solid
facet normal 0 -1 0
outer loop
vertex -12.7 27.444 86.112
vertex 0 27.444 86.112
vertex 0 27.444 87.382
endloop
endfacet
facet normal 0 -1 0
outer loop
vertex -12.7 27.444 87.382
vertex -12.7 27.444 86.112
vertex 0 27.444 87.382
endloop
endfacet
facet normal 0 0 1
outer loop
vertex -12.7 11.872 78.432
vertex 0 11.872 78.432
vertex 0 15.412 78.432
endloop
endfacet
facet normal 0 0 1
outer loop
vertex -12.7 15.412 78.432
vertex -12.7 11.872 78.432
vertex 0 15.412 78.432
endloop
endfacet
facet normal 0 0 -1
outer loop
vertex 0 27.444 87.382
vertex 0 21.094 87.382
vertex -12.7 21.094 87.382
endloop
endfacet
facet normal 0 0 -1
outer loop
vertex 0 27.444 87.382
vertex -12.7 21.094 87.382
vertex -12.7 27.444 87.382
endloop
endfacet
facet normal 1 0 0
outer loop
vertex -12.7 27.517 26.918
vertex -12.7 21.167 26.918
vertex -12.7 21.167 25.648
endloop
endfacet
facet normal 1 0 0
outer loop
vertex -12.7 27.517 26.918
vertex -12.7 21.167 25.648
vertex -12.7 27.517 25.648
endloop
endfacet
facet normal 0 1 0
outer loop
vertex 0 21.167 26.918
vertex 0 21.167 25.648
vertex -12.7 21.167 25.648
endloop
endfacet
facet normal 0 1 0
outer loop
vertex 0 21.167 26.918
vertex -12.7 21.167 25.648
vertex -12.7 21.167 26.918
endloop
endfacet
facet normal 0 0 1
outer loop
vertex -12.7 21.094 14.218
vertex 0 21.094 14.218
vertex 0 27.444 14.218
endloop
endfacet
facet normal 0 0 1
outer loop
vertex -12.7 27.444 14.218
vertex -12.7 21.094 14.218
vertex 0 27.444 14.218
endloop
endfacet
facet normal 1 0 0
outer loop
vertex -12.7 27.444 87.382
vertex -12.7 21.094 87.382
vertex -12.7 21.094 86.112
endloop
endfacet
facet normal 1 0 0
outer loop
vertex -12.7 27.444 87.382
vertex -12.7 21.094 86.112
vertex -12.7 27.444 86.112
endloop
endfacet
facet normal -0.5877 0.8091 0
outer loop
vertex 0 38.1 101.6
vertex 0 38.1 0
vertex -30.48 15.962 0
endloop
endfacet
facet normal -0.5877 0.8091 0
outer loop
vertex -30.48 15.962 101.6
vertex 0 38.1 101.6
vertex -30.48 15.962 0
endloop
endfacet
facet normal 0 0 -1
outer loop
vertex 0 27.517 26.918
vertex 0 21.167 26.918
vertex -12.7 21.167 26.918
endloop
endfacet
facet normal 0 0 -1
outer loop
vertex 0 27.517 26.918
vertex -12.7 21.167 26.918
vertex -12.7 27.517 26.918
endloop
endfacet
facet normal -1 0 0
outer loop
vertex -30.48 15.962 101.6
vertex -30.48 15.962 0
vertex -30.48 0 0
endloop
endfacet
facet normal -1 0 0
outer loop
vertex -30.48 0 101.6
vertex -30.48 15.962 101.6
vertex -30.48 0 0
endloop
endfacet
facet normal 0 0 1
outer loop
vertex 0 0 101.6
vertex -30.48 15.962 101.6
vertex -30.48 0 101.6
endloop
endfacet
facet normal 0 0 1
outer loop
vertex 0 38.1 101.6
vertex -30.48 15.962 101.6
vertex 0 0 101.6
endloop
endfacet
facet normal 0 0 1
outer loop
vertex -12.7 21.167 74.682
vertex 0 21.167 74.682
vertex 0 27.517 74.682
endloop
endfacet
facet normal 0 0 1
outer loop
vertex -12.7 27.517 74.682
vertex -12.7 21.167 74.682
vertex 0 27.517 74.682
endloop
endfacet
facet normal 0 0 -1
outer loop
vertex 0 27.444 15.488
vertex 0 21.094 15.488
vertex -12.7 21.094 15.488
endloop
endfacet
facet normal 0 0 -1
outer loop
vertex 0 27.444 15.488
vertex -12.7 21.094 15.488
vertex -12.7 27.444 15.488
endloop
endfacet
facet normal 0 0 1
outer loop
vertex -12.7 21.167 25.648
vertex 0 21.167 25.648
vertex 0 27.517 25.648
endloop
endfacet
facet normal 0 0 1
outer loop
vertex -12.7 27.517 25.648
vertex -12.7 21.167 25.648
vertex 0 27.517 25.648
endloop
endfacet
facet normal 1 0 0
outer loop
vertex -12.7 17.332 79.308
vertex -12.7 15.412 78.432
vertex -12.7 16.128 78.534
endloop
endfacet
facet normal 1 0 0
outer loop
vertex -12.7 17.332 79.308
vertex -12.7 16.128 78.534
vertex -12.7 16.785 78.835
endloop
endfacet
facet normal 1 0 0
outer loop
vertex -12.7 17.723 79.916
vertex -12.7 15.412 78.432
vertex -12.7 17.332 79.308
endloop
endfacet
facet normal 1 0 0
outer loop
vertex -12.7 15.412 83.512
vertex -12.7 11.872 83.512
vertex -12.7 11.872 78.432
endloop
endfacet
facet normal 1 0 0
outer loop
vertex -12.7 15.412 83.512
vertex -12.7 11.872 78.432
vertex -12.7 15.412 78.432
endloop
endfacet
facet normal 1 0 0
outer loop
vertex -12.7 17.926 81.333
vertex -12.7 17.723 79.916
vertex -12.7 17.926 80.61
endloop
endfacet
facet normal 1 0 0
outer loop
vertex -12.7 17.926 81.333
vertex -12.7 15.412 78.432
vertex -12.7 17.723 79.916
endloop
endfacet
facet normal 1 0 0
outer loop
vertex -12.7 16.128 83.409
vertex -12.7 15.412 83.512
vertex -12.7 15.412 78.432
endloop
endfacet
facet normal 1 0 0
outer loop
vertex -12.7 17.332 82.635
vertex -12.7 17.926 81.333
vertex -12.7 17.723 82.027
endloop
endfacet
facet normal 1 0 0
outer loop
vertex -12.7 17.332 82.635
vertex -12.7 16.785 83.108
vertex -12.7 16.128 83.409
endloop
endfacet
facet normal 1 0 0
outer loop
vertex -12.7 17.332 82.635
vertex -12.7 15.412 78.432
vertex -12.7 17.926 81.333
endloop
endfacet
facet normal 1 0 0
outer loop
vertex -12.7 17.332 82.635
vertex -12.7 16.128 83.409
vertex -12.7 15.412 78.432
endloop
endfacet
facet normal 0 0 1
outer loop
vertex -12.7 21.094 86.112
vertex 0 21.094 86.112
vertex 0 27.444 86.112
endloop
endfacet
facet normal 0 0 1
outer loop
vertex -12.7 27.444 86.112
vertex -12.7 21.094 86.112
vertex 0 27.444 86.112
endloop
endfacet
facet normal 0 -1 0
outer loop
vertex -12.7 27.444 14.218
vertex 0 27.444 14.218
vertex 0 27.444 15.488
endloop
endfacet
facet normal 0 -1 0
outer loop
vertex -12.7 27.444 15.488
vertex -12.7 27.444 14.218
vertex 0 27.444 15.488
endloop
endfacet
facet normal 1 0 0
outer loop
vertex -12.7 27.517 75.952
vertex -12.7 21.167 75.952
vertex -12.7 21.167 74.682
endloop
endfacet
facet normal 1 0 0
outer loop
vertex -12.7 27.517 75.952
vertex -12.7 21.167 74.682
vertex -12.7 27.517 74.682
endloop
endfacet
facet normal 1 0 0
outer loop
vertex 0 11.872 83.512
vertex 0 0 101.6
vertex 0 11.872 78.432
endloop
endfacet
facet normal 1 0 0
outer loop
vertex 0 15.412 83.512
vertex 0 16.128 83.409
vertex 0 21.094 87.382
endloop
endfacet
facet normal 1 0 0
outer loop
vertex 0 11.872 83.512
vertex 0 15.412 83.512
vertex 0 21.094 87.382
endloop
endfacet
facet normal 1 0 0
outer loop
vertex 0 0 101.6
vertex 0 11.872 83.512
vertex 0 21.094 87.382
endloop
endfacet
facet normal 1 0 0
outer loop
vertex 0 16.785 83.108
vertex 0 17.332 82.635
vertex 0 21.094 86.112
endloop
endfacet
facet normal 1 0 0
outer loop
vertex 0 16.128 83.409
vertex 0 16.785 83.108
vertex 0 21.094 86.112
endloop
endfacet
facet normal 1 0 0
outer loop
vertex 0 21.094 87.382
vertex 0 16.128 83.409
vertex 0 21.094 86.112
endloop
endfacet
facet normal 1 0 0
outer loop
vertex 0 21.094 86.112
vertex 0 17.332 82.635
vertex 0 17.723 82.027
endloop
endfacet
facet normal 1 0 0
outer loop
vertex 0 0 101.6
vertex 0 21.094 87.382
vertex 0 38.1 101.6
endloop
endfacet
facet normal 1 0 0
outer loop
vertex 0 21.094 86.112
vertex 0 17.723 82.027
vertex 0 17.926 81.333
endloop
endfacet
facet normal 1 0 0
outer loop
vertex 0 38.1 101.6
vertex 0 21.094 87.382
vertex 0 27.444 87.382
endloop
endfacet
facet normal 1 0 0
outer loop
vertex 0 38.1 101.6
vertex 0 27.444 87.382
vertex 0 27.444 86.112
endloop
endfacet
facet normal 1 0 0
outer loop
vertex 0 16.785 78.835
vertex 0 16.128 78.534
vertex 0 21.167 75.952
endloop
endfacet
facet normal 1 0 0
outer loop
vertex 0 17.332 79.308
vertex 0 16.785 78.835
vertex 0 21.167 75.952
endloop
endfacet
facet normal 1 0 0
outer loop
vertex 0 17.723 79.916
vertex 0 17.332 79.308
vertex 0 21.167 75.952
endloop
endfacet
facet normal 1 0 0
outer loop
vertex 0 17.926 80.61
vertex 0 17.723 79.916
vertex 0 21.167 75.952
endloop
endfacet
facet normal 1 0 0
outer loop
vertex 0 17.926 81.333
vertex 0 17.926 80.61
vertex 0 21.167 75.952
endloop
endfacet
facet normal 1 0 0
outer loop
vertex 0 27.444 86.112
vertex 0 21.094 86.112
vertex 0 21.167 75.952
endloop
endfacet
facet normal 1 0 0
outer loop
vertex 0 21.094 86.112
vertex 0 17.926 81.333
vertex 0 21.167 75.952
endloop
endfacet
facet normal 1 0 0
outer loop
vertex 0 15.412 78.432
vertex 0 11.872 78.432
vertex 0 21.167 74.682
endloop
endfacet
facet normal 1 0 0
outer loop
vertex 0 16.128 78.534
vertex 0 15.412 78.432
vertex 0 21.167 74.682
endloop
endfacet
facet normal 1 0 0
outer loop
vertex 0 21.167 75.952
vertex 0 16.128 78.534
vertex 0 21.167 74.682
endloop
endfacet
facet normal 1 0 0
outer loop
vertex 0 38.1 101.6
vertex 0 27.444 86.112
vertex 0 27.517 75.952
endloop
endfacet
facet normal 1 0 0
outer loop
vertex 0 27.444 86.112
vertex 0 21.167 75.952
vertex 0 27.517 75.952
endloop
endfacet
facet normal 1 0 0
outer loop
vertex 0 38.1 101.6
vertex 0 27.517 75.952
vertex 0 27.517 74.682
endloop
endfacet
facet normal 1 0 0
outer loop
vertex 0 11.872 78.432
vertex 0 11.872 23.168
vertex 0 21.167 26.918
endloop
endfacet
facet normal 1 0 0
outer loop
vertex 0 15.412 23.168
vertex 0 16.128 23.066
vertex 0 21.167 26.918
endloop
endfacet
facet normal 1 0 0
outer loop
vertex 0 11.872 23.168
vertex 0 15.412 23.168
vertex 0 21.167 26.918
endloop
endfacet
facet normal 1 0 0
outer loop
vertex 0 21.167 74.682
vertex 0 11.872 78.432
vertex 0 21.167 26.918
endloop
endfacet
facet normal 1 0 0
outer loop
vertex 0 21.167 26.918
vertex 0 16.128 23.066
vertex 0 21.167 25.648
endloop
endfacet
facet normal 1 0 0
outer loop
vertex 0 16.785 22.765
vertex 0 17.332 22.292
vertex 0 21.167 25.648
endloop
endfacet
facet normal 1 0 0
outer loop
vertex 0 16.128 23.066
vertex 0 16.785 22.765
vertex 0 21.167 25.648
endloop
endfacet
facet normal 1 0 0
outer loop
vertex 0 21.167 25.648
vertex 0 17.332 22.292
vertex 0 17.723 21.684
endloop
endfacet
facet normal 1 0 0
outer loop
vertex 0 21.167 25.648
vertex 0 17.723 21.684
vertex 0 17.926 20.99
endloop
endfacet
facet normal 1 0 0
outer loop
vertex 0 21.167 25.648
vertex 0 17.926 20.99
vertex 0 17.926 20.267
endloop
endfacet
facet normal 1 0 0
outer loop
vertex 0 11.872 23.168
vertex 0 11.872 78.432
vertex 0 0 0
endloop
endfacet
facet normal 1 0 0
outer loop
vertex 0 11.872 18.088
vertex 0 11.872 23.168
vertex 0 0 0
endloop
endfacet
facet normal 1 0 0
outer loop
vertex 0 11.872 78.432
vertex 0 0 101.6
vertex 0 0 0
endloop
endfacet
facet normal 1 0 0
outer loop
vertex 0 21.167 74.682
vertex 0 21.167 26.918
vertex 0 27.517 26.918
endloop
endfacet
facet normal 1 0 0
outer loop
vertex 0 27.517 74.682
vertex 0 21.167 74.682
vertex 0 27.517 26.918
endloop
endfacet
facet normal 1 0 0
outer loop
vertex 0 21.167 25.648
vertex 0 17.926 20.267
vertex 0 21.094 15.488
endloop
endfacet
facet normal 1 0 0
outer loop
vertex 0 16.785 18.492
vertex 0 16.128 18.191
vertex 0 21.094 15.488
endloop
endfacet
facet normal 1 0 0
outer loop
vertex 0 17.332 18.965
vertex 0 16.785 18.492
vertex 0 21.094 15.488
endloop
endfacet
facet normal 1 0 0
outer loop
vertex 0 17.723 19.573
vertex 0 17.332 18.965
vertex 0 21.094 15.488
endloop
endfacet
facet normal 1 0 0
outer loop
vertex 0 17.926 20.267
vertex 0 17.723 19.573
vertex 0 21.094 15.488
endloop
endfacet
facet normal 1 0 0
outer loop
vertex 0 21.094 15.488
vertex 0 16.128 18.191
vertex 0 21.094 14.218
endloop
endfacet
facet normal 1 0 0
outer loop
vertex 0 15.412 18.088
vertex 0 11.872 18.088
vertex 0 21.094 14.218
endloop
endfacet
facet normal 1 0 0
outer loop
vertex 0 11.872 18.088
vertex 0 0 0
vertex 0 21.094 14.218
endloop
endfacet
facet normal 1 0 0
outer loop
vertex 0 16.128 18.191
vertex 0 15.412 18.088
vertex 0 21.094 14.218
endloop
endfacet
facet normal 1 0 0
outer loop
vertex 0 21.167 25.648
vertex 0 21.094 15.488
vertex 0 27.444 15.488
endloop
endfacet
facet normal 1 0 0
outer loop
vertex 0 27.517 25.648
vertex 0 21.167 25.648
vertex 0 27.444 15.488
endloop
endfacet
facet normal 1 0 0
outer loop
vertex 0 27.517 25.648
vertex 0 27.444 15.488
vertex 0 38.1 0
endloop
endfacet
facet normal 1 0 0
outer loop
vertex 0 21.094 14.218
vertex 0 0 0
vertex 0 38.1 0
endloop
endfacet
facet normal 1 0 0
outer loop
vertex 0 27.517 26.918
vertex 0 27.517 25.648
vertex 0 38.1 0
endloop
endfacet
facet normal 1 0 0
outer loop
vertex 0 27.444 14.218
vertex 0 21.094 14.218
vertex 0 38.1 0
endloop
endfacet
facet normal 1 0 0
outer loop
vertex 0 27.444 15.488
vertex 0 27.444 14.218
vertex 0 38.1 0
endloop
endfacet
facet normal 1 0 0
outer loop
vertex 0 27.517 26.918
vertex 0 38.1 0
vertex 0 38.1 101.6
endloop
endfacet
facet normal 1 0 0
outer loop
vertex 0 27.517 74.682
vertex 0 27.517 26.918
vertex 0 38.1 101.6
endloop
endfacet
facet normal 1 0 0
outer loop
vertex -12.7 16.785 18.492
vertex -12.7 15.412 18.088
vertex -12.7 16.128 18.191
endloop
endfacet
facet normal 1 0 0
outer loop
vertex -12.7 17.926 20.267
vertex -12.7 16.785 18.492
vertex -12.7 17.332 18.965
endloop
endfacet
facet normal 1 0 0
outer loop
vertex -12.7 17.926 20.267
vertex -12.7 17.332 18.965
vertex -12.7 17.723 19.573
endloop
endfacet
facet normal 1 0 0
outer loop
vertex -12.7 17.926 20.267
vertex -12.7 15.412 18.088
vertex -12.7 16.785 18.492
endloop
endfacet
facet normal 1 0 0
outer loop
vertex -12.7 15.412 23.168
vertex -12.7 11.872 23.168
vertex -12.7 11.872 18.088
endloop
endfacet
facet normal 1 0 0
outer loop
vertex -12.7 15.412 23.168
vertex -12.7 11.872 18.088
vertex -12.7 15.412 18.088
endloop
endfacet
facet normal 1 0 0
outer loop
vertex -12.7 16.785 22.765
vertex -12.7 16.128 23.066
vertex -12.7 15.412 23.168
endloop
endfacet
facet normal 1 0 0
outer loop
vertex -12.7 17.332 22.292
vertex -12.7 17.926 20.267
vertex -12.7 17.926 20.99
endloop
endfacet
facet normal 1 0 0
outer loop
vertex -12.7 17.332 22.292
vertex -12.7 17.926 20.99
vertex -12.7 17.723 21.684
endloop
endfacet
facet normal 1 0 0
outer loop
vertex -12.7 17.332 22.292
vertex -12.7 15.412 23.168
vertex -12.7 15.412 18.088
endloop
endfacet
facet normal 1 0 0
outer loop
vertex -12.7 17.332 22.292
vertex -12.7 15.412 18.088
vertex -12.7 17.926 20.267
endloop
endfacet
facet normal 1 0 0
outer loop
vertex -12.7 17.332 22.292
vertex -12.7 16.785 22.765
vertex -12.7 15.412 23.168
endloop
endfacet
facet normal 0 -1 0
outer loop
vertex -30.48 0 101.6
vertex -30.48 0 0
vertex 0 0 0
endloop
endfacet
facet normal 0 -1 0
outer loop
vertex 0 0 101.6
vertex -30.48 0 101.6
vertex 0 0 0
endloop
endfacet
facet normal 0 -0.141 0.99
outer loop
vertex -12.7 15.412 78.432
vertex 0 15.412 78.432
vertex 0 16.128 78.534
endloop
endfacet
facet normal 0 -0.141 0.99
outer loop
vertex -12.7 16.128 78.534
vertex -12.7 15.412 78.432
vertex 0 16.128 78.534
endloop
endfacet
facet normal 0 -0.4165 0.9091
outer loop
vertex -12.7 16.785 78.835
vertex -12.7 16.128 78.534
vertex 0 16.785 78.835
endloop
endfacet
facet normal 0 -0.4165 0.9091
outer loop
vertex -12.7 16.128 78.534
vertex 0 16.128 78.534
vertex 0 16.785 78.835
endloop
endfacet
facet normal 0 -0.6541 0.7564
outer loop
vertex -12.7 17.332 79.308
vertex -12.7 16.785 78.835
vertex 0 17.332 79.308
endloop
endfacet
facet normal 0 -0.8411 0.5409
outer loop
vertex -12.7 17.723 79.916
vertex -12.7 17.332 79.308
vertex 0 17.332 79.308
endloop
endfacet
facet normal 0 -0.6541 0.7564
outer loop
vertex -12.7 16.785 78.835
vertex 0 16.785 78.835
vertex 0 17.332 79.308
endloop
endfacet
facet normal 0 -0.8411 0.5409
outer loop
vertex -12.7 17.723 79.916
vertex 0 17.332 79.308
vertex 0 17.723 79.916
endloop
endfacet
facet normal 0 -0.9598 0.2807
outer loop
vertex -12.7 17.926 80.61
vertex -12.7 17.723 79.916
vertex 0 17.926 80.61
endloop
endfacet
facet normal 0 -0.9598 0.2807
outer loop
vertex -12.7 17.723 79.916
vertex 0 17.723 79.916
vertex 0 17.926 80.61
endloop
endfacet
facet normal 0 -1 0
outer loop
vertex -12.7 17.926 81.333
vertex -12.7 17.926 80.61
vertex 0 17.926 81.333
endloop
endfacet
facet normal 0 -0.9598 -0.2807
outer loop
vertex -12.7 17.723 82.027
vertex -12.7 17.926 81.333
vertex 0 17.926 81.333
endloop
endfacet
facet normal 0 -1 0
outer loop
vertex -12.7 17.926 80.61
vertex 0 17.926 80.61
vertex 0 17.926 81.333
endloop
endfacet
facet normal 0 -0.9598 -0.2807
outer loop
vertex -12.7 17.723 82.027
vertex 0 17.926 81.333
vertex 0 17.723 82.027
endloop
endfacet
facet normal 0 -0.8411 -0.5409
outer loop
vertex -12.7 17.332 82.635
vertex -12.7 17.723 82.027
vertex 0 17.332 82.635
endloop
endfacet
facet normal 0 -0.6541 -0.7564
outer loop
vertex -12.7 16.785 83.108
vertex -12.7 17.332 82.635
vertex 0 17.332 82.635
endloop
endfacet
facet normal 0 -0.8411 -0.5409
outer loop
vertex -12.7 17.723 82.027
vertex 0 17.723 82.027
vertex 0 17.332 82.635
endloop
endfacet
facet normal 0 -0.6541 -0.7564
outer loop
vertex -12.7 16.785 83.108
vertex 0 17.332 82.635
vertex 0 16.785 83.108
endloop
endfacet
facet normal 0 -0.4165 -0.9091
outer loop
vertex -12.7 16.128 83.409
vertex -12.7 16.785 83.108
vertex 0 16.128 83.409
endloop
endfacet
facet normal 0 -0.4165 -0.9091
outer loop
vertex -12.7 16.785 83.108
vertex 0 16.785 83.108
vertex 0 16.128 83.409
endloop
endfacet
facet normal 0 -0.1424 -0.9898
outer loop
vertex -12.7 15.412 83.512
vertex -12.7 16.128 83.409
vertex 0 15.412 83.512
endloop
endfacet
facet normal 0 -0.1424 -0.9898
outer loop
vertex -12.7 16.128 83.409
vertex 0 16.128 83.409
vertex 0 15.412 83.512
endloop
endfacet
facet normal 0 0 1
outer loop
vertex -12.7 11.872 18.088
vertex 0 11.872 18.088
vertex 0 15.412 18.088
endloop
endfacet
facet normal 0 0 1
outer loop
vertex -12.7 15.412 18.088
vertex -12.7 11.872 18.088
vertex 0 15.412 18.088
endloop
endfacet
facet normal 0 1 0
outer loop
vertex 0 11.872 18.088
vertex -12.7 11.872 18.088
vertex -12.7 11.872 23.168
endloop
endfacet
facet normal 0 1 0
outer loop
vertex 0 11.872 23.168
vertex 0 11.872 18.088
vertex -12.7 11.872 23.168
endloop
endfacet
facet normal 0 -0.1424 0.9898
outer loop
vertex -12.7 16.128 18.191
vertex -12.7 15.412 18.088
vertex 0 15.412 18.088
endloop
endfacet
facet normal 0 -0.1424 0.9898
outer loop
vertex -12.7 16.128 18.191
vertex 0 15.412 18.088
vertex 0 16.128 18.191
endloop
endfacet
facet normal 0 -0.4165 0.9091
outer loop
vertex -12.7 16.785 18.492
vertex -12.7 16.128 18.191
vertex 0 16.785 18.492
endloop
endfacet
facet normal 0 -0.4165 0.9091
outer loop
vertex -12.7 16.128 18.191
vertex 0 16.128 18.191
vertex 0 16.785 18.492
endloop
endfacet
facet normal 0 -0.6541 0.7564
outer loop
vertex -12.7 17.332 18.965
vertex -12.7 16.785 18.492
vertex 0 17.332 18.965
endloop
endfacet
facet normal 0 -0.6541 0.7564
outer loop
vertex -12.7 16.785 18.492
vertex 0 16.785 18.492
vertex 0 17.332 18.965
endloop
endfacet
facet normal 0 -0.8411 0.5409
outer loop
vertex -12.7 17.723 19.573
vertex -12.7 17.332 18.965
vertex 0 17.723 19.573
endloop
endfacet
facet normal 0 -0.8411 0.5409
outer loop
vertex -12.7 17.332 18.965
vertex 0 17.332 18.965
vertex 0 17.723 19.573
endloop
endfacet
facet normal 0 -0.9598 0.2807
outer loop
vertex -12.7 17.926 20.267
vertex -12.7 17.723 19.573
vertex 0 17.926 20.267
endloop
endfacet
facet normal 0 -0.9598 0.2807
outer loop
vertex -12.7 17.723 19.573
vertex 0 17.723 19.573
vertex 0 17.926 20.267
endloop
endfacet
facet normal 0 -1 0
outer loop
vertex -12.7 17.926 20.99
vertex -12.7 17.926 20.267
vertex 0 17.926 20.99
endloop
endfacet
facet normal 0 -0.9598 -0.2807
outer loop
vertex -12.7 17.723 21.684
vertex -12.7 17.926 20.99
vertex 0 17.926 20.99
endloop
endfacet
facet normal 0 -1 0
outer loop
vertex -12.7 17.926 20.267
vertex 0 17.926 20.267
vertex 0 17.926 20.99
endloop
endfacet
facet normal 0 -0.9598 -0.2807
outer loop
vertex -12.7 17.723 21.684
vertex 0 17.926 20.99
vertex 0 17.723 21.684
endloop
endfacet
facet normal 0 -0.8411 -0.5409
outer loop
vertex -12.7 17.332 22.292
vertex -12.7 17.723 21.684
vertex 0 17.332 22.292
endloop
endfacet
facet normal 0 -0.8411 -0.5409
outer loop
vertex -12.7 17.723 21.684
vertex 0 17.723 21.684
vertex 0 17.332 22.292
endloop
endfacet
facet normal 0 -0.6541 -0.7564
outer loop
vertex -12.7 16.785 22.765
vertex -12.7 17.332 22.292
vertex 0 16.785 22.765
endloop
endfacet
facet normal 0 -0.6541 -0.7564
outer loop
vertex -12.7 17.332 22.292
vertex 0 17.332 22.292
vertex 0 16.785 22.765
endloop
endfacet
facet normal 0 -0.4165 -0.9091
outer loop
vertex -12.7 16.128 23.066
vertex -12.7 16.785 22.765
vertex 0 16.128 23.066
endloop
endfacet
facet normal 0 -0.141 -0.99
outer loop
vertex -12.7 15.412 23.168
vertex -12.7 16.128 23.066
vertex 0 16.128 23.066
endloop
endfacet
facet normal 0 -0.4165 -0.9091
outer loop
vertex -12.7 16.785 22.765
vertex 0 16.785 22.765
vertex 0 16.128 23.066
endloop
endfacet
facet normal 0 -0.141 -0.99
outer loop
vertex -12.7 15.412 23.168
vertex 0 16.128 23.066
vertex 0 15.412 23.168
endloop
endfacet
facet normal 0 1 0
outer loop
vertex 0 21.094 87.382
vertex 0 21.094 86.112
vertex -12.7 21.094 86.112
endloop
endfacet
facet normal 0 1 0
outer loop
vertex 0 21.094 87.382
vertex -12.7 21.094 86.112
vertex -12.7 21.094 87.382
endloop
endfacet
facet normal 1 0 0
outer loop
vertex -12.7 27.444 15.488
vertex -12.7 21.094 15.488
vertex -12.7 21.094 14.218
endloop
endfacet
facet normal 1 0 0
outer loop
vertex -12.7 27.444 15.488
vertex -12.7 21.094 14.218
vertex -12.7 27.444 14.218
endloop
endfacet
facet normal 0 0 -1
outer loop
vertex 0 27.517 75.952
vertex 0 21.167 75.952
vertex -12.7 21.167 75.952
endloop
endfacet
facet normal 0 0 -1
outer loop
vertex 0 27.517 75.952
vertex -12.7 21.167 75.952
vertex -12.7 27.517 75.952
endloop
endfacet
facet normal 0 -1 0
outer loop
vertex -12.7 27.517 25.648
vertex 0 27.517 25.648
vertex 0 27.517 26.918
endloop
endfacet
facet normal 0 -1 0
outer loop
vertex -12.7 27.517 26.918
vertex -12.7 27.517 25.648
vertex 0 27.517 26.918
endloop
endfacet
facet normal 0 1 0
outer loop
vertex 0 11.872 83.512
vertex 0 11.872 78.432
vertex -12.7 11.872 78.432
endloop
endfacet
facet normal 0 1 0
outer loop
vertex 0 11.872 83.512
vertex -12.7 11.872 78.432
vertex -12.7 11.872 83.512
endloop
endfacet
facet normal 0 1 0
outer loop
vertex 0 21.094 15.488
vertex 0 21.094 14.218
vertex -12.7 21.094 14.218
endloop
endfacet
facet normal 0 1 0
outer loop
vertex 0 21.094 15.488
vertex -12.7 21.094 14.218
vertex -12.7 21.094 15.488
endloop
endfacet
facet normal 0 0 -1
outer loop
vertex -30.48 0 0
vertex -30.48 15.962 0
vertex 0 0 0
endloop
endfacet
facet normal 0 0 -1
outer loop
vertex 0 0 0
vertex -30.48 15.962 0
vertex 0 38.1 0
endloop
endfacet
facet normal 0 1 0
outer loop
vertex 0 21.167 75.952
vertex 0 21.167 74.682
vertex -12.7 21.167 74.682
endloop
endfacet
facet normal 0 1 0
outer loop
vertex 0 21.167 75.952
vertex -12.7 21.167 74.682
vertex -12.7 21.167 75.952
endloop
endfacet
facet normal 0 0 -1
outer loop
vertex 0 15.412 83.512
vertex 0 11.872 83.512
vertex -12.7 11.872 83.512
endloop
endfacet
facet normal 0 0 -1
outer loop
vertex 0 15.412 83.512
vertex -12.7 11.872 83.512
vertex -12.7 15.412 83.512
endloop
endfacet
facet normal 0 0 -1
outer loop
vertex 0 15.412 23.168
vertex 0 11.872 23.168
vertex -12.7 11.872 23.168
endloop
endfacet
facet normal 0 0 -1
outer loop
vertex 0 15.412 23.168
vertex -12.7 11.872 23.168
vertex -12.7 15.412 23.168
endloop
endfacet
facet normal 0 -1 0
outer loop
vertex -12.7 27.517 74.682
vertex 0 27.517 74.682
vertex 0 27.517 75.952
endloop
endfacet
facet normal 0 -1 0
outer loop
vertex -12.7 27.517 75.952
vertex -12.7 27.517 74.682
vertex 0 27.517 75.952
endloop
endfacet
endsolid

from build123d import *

# Parameters (mm, degrees)
F1_DEPTH = 101.6
F2_W     = 6.35
F2_H     = 1.27
F2_W_2   = 3.5404078662
F2_H_2   = 5.08
F3_DEPTH = 12.7
F4_DEPTH = 12.7


with BuildPart() as f1:
    # F0 (on Top) → F1 (new body)
    with BuildSketch(Plane.XY):
        Polygon((0, 38.1), (-30.48, 15.961895347), (-30.48, 0), (0, 0), align=None)
    extrude(amount=F1_DEPTH)

    # F2 (on face) → F3 (cut)
    with BuildSketch(Plane.YZ):
        with Locations((24.2689500645, 86.7467758033)):
            Rectangle(F2_W, F2_H)
        with Locations((24.3418384343, 75.3167758033)):
            Rectangle(F2_W, F2_H)
        with Locations((13.6419944465, 80.9715090013)):
            Rectangle(F2_W_2, F2_H_2)
        with BuildLine():
            ThreePointArc((15.4121983796, 78.4315090013), (17.9521983796, 80.9715090013), (15.4121983796, 83.5115090013))
            Line((15.4121983796, 83.5115090013), (15.4121983796, 78.4315090013))
        make_face()
    extrude(amount=-F3_DEPTH, mode=Mode.SUBTRACT)

    # F2 (on face) → F4 (cut)
    with BuildSketch(Plane.YZ):
        with Locations((24.3418384343, 26.2832241967)):
            Rectangle(F2_W, F2_H)
        with Locations((24.2689500645, 14.8532241967)):
            Rectangle(F2_W, F2_H)
        with BuildLine():
            ThreePointArc((15.4121983796, 18.0884909987), (17.9521983796, 20.6284909987), (15.4121983796, 23.1684909987))
            Line((15.4121983796, 23.1684909987), (15.4121983796, 18.0884909987))
        make_face()
        with Locations((13.6419944465, 20.6284909987)):
            Rectangle(F2_W_2, F2_H_2)
    extrude(amount=-F4_DEPTH, mode=Mode.SUBTRACT)


solid = f1.part
